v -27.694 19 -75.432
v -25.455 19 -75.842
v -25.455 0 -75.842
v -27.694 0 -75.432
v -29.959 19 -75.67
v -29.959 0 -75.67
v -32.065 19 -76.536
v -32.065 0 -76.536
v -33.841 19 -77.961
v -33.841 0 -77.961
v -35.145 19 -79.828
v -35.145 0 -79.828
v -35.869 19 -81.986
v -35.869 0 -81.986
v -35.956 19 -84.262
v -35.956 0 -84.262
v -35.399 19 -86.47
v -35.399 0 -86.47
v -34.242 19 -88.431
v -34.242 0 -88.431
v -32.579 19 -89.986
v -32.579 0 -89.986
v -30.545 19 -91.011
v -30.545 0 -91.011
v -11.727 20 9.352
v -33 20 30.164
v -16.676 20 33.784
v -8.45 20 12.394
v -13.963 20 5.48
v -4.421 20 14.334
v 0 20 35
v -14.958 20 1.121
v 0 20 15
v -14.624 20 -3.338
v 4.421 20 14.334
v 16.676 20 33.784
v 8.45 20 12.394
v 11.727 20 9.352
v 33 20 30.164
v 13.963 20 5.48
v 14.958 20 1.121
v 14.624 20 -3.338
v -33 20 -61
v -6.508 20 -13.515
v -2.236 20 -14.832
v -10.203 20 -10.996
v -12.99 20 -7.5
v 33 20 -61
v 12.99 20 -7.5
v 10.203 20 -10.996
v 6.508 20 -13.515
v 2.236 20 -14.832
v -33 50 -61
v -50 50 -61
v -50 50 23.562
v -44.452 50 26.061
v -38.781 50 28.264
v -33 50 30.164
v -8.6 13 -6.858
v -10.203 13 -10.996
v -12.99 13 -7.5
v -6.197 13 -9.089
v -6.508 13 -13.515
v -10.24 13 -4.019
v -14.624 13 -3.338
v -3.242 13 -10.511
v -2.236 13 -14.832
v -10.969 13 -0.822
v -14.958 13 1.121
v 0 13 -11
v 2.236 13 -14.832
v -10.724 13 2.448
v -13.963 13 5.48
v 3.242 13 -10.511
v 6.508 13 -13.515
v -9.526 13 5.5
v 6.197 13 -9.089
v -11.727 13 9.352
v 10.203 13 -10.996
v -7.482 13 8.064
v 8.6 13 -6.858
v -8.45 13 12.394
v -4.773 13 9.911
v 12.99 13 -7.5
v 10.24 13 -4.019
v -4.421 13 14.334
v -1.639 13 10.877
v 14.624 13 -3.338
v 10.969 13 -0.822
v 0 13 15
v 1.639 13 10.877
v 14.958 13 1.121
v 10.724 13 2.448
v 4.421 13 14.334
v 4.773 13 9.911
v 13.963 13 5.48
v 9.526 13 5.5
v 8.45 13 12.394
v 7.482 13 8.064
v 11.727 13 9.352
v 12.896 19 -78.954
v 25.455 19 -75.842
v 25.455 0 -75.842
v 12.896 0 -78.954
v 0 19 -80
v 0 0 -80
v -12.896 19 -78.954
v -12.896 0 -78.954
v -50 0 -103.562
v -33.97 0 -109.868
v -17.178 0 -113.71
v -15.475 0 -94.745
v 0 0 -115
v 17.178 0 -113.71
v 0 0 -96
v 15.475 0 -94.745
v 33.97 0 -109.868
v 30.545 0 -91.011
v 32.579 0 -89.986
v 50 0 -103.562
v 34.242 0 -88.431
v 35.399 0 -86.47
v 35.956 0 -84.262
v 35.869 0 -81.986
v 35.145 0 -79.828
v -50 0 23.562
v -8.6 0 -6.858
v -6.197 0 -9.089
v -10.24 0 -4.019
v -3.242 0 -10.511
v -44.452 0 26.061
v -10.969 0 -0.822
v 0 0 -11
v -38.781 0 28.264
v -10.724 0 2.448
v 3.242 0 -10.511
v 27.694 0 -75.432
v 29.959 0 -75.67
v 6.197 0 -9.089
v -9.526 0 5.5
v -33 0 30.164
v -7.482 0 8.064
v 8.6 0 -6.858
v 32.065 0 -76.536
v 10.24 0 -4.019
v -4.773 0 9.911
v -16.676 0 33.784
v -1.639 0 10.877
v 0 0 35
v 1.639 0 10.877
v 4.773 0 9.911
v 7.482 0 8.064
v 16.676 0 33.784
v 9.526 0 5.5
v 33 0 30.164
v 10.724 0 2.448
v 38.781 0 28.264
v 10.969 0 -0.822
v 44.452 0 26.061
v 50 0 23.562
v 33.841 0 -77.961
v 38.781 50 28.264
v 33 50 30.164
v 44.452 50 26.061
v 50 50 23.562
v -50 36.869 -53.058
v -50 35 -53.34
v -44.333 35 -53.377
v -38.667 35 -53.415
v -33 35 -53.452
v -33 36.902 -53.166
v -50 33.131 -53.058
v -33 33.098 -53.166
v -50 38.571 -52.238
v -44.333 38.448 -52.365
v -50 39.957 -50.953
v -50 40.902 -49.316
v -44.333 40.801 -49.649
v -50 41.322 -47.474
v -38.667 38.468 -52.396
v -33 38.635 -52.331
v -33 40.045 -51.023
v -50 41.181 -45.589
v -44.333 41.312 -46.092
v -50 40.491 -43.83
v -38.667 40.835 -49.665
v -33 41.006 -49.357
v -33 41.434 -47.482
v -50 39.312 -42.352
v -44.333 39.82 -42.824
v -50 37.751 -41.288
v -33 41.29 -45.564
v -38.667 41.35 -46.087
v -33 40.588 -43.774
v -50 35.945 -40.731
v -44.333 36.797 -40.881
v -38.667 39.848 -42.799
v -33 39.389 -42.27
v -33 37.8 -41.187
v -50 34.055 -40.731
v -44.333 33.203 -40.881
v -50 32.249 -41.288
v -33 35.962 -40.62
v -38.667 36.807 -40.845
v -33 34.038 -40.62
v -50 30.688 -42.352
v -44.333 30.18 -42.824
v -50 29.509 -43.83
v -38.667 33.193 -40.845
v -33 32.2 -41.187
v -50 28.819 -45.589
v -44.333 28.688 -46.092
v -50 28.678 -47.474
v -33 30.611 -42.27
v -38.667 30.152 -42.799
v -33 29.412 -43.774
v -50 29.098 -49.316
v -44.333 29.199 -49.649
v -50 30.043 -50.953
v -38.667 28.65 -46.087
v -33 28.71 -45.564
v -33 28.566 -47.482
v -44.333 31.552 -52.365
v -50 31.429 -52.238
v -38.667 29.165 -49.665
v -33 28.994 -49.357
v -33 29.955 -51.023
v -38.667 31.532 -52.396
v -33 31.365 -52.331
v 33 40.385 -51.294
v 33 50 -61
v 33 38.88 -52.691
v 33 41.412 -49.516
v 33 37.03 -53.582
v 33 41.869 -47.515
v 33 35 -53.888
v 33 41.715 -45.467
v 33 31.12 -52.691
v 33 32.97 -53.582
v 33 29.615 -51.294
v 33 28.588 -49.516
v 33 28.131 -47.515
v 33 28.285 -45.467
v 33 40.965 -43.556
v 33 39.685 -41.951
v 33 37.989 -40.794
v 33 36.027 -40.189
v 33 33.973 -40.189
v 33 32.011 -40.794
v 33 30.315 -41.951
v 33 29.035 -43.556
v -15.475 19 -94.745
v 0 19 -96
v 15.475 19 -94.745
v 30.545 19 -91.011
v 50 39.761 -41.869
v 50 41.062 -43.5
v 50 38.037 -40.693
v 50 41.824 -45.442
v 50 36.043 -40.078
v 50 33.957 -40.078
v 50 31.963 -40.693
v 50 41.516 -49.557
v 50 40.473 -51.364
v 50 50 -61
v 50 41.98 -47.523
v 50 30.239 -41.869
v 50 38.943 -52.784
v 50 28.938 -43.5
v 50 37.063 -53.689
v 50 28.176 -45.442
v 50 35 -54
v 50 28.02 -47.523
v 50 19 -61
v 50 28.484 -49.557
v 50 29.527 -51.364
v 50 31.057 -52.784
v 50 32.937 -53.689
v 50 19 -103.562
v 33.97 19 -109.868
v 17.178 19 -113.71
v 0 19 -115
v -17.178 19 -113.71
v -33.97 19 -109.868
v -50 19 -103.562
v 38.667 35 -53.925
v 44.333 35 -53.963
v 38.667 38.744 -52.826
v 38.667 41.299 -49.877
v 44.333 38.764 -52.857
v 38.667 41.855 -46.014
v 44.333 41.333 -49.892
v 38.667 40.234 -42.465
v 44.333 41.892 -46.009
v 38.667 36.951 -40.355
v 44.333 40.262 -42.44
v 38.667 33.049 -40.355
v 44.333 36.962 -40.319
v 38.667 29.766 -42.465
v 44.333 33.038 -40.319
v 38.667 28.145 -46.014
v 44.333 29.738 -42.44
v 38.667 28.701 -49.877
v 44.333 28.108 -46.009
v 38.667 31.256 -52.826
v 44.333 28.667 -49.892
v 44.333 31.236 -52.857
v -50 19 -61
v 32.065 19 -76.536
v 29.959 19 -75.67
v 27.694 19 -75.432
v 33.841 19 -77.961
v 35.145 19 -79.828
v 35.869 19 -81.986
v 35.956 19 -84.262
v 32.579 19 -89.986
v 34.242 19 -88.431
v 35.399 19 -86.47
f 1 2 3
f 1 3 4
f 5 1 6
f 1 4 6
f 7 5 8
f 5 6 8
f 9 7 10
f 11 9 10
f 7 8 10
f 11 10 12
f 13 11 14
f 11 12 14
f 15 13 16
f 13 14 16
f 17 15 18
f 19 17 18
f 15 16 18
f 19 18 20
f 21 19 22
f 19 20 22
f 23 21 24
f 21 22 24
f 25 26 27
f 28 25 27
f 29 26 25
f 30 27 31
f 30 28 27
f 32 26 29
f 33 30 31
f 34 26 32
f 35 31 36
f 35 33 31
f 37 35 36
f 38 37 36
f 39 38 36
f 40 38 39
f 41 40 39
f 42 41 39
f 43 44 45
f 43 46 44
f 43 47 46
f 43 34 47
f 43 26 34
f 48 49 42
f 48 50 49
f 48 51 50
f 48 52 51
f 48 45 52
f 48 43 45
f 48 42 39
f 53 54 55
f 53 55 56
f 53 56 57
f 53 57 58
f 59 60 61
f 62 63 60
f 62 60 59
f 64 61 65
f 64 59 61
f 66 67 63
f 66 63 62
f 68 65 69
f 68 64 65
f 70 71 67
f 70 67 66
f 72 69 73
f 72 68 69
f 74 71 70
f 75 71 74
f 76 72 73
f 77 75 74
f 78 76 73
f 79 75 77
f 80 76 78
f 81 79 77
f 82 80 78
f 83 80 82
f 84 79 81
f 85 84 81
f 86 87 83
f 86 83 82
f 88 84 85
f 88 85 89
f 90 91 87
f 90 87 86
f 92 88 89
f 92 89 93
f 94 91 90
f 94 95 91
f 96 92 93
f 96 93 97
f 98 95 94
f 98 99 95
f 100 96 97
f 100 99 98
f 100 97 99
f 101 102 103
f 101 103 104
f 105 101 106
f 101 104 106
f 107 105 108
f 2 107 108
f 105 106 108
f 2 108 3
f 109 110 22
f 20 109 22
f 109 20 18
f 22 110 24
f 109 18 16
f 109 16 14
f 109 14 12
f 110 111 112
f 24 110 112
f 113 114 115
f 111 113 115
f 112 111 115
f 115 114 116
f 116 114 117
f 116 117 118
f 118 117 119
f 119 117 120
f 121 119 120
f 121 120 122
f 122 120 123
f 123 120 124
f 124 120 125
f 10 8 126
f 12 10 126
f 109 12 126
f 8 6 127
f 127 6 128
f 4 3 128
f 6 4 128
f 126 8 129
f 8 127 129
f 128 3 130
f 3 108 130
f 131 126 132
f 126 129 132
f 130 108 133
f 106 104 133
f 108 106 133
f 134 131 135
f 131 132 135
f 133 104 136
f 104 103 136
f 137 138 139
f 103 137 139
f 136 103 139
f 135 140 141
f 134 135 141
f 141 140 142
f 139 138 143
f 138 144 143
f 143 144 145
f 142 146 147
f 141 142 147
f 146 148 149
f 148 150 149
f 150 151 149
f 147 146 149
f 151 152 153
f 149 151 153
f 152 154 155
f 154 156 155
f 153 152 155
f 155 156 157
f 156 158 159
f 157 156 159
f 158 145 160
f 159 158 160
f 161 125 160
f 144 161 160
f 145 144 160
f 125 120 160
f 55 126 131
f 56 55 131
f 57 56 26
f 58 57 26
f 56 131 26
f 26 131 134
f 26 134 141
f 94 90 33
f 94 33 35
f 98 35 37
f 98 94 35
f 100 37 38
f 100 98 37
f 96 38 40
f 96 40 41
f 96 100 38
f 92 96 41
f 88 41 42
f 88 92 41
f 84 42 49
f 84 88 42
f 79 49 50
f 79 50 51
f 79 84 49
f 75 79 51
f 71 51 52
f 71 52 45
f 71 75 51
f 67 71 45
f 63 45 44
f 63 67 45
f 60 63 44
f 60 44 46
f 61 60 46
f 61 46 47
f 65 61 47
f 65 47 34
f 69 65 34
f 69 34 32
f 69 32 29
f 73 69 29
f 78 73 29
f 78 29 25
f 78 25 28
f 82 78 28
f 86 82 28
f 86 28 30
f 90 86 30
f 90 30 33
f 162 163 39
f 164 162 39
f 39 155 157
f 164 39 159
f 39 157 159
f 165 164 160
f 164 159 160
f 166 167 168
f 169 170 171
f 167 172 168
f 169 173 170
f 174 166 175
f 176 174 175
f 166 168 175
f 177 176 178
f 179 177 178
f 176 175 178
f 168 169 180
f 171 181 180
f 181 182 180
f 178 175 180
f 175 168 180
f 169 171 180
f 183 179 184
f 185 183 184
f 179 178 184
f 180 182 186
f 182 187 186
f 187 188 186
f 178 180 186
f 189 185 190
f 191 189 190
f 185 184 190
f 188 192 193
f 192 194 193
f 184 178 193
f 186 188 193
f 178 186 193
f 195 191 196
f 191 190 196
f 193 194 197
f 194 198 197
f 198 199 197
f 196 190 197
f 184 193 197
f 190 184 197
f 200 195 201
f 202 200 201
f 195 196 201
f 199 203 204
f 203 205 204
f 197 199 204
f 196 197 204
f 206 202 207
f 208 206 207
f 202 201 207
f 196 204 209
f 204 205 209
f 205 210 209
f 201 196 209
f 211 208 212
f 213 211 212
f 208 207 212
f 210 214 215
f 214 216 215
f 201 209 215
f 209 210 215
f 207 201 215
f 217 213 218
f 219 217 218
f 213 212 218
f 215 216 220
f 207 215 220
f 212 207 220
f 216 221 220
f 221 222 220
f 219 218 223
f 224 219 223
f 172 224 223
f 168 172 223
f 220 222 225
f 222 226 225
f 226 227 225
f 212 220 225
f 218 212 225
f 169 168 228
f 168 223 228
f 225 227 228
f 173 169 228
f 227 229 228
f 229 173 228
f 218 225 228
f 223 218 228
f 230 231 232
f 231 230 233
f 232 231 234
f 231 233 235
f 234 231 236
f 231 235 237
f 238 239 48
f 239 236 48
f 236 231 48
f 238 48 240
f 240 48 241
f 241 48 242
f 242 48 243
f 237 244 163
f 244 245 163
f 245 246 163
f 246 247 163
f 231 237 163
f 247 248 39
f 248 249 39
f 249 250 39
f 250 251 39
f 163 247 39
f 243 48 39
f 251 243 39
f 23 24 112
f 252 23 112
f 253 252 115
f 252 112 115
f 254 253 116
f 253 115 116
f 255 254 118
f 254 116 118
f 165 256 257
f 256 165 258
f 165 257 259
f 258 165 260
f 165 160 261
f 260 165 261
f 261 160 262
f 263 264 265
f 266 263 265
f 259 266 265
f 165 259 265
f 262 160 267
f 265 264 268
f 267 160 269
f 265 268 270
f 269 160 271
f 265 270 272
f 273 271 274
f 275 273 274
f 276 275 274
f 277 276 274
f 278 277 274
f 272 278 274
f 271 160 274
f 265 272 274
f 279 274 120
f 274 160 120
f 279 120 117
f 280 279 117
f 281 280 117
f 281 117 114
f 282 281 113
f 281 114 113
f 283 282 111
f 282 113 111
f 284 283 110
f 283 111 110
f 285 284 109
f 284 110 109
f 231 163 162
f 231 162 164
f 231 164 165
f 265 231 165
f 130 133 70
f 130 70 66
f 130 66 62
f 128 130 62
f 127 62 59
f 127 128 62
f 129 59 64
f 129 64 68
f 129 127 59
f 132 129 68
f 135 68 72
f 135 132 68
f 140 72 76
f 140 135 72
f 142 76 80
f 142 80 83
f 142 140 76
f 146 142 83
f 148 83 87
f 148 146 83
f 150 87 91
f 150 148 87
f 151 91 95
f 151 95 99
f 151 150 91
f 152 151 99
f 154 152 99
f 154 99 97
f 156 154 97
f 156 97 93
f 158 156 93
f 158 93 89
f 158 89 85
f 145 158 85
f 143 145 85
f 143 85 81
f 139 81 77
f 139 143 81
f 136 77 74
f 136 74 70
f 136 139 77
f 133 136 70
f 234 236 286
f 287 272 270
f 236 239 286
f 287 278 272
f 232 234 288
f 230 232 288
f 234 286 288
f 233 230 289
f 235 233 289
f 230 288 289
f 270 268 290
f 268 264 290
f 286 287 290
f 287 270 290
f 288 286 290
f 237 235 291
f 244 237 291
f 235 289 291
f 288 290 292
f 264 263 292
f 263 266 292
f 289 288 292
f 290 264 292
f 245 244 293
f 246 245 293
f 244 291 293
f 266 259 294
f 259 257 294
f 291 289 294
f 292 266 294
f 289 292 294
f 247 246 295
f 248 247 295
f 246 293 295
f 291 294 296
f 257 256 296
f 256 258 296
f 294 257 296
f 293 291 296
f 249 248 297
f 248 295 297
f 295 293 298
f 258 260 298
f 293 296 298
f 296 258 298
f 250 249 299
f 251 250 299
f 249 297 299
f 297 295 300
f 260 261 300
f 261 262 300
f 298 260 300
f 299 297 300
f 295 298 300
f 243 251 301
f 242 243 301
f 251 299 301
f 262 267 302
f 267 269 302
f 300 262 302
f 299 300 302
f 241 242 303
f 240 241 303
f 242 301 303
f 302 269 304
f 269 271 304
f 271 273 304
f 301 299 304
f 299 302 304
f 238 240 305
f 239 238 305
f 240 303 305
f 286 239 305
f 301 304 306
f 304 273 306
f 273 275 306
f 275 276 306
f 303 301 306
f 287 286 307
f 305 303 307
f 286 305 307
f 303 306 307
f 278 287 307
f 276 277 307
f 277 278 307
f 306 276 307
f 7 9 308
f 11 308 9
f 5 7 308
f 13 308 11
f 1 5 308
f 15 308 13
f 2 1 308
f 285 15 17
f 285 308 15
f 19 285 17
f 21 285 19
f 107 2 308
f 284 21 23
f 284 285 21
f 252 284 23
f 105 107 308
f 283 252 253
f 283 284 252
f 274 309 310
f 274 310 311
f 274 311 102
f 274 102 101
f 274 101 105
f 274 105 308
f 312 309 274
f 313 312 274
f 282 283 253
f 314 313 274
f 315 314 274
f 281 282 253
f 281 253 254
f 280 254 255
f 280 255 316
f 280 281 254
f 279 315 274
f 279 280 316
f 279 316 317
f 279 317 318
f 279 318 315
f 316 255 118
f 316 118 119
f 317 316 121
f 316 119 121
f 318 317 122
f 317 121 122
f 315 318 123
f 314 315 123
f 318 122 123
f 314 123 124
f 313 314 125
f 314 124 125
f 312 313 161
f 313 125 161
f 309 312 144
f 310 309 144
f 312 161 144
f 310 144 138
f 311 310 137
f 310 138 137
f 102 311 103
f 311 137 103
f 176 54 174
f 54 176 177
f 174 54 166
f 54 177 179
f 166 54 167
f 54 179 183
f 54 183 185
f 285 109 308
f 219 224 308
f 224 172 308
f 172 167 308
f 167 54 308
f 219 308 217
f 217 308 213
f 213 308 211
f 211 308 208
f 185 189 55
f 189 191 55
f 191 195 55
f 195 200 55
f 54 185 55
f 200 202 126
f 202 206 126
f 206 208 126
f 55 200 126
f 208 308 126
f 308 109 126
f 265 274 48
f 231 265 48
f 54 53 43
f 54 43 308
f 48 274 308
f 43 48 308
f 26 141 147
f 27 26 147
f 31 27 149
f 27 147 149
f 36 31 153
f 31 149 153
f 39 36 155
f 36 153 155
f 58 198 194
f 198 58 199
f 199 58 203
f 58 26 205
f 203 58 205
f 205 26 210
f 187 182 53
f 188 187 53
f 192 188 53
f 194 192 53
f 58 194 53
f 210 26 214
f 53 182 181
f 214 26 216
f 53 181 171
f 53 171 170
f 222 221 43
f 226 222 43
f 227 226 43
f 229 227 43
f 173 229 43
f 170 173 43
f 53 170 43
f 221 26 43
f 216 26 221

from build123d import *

# Parameters (mm, degrees)
BOSS_EXTRUDE1_DEPTH   = 50
BOSS_EXTRUDE1_2_DEPTH = 50
SKETCH1_3_R           = 15
BOSS_EXTRUDE2_DEPTH   = 20
BOSS_EXTRUDE3_DEPTH   = 19
SKETCH1_5_R           = 15
SKETCH1_5_R_2         = 11
BOSS_EXTRUDE4_DEPTH   = 13


with BuildPart() as part:
    # Sketch1 → Boss-Extrude1 (new body)
    with BuildSketch(Plane(origin=(0, 0, 0), x_dir=(1, 0, 0), z_dir=(0, 1, 0))):
        with BuildLine():
            Line((-33, 61), (-50, 61))
            Line((-50, 61), (-50, -23.561575886))
            ThreePointArc((-50, -23.561575886), (-41.631074926, -27.200063435), (-33, -30.163514831))
            Line((-33, -30.163514831), (-33, 61))
        make_face()
    extrude(amount=BOSS_EXTRUDE1_DEPTH)



with BuildPart() as body_2:
    # Sketch1 → Boss-Extrude1 2 (new body)
    with BuildSketch(Plane(origin=(0, 0, 0), x_dir=(1, 0, 0), z_dir=(0, 1, 0))):
        with BuildLine():
            Line((50, -23.561575886), (50, 61))
            Line((50, 61), (33, 61))
            Line((33, 61), (33, -30.163514831))
            ThreePointArc((33, -30.163514831), (41.631074926, -27.200063435), (50, -23.561575886))
        make_face()
    extrude(amount=BOSS_EXTRUDE1_2_DEPTH)


with BuildPart() as part_1:
    add(part.part)

    add(body_2.part)  # Boss-Extrude2 merges body 2
    # Sketch1<3> → Boss-Extrude2 (add)
    with BuildSketch(Plane(origin=(0, 0, 0), x_dir=(1, 0, 0), z_dir=(0, 1, 0))):
        with BuildLine():
            Line((33, 61), (-33, 61))
            Line((-33, 61), (-33, -30.163514831))
            ThreePointArc((-33, -30.163514831), (0, -35), (33, -30.163514831))
            Line((33, -30.163514831), (33, 61))
        make_face()
        Circle(SKETCH1_3_R, mode=Mode.SUBTRACT)
    extrude(amount=BOSS_EXTRUDE2_DEPTH)

    # Sketch1<4> → Boss-Extrude3 (add)
    with BuildSketch(Plane(origin=(0, 0, 0), x_dir=(1, 0, 0), z_dir=(0, 1, 0))):
        with BuildLine():
            ThreePointArc((50, 103.561575886), (0, 115), (-50, 103.561575886))
            Line((-50, 103.561575886), (-50, 61))
            Line((-50, 61), (-33, 61))
            Line((-33, 61), (33, 61))
            Line((33, 61), (50, 61))
            Line((50, 61), (50, 103.561575886))
        make_face()
        with BuildLine():
            ThreePointArc((-30.545454545, 91.010852136), (0, 96), (30.545454545, 91.010852136))
            ThreePointArc((30.545454545, 91.010852136), (35.584237678, 80.881159913), (25.454545455, 75.84237678))
            ThreePointArc((25.454545455, 75.84237678), (0, 80), (-25.454545455, 75.84237678))
            ThreePointArc((-25.454545455, 75.84237678), (-35.584237678, 80.881159913), (-30.545454545, 91.010852136))
        make_face(mode=Mode.SUBTRACT)
    extrude(amount=BOSS_EXTRUDE3_DEPTH)

    # Sketch1<5> → Boss-Extrude4 (add)
    with BuildSketch(Plane(origin=(0, 0, 0), x_dir=(1, 0, 0), z_dir=(0, 1, 0))):
        Circle(SKETCH1_5_R)
        Circle(SKETCH1_5_R_2, mode=Mode.SUBTRACT)
    extrude(amount=BOSS_EXTRUDE4_DEPTH)

    # Sketch3 → Cut-Revolve1 (revolve, cut)
    with BuildSketch(Plane(origin=(0, 35, 0), x_dir=(1, 0, 0), z_dir=(0, 1, 0))):
        Polygon((-50, 53.34), (50, 54), (50, 47), (-50, 47), align=None)
    revolve(axis=Axis((-50, 35, -47), (1, 0, 0)), mode=Mode.SUBTRACT)


solid = part_1.part
